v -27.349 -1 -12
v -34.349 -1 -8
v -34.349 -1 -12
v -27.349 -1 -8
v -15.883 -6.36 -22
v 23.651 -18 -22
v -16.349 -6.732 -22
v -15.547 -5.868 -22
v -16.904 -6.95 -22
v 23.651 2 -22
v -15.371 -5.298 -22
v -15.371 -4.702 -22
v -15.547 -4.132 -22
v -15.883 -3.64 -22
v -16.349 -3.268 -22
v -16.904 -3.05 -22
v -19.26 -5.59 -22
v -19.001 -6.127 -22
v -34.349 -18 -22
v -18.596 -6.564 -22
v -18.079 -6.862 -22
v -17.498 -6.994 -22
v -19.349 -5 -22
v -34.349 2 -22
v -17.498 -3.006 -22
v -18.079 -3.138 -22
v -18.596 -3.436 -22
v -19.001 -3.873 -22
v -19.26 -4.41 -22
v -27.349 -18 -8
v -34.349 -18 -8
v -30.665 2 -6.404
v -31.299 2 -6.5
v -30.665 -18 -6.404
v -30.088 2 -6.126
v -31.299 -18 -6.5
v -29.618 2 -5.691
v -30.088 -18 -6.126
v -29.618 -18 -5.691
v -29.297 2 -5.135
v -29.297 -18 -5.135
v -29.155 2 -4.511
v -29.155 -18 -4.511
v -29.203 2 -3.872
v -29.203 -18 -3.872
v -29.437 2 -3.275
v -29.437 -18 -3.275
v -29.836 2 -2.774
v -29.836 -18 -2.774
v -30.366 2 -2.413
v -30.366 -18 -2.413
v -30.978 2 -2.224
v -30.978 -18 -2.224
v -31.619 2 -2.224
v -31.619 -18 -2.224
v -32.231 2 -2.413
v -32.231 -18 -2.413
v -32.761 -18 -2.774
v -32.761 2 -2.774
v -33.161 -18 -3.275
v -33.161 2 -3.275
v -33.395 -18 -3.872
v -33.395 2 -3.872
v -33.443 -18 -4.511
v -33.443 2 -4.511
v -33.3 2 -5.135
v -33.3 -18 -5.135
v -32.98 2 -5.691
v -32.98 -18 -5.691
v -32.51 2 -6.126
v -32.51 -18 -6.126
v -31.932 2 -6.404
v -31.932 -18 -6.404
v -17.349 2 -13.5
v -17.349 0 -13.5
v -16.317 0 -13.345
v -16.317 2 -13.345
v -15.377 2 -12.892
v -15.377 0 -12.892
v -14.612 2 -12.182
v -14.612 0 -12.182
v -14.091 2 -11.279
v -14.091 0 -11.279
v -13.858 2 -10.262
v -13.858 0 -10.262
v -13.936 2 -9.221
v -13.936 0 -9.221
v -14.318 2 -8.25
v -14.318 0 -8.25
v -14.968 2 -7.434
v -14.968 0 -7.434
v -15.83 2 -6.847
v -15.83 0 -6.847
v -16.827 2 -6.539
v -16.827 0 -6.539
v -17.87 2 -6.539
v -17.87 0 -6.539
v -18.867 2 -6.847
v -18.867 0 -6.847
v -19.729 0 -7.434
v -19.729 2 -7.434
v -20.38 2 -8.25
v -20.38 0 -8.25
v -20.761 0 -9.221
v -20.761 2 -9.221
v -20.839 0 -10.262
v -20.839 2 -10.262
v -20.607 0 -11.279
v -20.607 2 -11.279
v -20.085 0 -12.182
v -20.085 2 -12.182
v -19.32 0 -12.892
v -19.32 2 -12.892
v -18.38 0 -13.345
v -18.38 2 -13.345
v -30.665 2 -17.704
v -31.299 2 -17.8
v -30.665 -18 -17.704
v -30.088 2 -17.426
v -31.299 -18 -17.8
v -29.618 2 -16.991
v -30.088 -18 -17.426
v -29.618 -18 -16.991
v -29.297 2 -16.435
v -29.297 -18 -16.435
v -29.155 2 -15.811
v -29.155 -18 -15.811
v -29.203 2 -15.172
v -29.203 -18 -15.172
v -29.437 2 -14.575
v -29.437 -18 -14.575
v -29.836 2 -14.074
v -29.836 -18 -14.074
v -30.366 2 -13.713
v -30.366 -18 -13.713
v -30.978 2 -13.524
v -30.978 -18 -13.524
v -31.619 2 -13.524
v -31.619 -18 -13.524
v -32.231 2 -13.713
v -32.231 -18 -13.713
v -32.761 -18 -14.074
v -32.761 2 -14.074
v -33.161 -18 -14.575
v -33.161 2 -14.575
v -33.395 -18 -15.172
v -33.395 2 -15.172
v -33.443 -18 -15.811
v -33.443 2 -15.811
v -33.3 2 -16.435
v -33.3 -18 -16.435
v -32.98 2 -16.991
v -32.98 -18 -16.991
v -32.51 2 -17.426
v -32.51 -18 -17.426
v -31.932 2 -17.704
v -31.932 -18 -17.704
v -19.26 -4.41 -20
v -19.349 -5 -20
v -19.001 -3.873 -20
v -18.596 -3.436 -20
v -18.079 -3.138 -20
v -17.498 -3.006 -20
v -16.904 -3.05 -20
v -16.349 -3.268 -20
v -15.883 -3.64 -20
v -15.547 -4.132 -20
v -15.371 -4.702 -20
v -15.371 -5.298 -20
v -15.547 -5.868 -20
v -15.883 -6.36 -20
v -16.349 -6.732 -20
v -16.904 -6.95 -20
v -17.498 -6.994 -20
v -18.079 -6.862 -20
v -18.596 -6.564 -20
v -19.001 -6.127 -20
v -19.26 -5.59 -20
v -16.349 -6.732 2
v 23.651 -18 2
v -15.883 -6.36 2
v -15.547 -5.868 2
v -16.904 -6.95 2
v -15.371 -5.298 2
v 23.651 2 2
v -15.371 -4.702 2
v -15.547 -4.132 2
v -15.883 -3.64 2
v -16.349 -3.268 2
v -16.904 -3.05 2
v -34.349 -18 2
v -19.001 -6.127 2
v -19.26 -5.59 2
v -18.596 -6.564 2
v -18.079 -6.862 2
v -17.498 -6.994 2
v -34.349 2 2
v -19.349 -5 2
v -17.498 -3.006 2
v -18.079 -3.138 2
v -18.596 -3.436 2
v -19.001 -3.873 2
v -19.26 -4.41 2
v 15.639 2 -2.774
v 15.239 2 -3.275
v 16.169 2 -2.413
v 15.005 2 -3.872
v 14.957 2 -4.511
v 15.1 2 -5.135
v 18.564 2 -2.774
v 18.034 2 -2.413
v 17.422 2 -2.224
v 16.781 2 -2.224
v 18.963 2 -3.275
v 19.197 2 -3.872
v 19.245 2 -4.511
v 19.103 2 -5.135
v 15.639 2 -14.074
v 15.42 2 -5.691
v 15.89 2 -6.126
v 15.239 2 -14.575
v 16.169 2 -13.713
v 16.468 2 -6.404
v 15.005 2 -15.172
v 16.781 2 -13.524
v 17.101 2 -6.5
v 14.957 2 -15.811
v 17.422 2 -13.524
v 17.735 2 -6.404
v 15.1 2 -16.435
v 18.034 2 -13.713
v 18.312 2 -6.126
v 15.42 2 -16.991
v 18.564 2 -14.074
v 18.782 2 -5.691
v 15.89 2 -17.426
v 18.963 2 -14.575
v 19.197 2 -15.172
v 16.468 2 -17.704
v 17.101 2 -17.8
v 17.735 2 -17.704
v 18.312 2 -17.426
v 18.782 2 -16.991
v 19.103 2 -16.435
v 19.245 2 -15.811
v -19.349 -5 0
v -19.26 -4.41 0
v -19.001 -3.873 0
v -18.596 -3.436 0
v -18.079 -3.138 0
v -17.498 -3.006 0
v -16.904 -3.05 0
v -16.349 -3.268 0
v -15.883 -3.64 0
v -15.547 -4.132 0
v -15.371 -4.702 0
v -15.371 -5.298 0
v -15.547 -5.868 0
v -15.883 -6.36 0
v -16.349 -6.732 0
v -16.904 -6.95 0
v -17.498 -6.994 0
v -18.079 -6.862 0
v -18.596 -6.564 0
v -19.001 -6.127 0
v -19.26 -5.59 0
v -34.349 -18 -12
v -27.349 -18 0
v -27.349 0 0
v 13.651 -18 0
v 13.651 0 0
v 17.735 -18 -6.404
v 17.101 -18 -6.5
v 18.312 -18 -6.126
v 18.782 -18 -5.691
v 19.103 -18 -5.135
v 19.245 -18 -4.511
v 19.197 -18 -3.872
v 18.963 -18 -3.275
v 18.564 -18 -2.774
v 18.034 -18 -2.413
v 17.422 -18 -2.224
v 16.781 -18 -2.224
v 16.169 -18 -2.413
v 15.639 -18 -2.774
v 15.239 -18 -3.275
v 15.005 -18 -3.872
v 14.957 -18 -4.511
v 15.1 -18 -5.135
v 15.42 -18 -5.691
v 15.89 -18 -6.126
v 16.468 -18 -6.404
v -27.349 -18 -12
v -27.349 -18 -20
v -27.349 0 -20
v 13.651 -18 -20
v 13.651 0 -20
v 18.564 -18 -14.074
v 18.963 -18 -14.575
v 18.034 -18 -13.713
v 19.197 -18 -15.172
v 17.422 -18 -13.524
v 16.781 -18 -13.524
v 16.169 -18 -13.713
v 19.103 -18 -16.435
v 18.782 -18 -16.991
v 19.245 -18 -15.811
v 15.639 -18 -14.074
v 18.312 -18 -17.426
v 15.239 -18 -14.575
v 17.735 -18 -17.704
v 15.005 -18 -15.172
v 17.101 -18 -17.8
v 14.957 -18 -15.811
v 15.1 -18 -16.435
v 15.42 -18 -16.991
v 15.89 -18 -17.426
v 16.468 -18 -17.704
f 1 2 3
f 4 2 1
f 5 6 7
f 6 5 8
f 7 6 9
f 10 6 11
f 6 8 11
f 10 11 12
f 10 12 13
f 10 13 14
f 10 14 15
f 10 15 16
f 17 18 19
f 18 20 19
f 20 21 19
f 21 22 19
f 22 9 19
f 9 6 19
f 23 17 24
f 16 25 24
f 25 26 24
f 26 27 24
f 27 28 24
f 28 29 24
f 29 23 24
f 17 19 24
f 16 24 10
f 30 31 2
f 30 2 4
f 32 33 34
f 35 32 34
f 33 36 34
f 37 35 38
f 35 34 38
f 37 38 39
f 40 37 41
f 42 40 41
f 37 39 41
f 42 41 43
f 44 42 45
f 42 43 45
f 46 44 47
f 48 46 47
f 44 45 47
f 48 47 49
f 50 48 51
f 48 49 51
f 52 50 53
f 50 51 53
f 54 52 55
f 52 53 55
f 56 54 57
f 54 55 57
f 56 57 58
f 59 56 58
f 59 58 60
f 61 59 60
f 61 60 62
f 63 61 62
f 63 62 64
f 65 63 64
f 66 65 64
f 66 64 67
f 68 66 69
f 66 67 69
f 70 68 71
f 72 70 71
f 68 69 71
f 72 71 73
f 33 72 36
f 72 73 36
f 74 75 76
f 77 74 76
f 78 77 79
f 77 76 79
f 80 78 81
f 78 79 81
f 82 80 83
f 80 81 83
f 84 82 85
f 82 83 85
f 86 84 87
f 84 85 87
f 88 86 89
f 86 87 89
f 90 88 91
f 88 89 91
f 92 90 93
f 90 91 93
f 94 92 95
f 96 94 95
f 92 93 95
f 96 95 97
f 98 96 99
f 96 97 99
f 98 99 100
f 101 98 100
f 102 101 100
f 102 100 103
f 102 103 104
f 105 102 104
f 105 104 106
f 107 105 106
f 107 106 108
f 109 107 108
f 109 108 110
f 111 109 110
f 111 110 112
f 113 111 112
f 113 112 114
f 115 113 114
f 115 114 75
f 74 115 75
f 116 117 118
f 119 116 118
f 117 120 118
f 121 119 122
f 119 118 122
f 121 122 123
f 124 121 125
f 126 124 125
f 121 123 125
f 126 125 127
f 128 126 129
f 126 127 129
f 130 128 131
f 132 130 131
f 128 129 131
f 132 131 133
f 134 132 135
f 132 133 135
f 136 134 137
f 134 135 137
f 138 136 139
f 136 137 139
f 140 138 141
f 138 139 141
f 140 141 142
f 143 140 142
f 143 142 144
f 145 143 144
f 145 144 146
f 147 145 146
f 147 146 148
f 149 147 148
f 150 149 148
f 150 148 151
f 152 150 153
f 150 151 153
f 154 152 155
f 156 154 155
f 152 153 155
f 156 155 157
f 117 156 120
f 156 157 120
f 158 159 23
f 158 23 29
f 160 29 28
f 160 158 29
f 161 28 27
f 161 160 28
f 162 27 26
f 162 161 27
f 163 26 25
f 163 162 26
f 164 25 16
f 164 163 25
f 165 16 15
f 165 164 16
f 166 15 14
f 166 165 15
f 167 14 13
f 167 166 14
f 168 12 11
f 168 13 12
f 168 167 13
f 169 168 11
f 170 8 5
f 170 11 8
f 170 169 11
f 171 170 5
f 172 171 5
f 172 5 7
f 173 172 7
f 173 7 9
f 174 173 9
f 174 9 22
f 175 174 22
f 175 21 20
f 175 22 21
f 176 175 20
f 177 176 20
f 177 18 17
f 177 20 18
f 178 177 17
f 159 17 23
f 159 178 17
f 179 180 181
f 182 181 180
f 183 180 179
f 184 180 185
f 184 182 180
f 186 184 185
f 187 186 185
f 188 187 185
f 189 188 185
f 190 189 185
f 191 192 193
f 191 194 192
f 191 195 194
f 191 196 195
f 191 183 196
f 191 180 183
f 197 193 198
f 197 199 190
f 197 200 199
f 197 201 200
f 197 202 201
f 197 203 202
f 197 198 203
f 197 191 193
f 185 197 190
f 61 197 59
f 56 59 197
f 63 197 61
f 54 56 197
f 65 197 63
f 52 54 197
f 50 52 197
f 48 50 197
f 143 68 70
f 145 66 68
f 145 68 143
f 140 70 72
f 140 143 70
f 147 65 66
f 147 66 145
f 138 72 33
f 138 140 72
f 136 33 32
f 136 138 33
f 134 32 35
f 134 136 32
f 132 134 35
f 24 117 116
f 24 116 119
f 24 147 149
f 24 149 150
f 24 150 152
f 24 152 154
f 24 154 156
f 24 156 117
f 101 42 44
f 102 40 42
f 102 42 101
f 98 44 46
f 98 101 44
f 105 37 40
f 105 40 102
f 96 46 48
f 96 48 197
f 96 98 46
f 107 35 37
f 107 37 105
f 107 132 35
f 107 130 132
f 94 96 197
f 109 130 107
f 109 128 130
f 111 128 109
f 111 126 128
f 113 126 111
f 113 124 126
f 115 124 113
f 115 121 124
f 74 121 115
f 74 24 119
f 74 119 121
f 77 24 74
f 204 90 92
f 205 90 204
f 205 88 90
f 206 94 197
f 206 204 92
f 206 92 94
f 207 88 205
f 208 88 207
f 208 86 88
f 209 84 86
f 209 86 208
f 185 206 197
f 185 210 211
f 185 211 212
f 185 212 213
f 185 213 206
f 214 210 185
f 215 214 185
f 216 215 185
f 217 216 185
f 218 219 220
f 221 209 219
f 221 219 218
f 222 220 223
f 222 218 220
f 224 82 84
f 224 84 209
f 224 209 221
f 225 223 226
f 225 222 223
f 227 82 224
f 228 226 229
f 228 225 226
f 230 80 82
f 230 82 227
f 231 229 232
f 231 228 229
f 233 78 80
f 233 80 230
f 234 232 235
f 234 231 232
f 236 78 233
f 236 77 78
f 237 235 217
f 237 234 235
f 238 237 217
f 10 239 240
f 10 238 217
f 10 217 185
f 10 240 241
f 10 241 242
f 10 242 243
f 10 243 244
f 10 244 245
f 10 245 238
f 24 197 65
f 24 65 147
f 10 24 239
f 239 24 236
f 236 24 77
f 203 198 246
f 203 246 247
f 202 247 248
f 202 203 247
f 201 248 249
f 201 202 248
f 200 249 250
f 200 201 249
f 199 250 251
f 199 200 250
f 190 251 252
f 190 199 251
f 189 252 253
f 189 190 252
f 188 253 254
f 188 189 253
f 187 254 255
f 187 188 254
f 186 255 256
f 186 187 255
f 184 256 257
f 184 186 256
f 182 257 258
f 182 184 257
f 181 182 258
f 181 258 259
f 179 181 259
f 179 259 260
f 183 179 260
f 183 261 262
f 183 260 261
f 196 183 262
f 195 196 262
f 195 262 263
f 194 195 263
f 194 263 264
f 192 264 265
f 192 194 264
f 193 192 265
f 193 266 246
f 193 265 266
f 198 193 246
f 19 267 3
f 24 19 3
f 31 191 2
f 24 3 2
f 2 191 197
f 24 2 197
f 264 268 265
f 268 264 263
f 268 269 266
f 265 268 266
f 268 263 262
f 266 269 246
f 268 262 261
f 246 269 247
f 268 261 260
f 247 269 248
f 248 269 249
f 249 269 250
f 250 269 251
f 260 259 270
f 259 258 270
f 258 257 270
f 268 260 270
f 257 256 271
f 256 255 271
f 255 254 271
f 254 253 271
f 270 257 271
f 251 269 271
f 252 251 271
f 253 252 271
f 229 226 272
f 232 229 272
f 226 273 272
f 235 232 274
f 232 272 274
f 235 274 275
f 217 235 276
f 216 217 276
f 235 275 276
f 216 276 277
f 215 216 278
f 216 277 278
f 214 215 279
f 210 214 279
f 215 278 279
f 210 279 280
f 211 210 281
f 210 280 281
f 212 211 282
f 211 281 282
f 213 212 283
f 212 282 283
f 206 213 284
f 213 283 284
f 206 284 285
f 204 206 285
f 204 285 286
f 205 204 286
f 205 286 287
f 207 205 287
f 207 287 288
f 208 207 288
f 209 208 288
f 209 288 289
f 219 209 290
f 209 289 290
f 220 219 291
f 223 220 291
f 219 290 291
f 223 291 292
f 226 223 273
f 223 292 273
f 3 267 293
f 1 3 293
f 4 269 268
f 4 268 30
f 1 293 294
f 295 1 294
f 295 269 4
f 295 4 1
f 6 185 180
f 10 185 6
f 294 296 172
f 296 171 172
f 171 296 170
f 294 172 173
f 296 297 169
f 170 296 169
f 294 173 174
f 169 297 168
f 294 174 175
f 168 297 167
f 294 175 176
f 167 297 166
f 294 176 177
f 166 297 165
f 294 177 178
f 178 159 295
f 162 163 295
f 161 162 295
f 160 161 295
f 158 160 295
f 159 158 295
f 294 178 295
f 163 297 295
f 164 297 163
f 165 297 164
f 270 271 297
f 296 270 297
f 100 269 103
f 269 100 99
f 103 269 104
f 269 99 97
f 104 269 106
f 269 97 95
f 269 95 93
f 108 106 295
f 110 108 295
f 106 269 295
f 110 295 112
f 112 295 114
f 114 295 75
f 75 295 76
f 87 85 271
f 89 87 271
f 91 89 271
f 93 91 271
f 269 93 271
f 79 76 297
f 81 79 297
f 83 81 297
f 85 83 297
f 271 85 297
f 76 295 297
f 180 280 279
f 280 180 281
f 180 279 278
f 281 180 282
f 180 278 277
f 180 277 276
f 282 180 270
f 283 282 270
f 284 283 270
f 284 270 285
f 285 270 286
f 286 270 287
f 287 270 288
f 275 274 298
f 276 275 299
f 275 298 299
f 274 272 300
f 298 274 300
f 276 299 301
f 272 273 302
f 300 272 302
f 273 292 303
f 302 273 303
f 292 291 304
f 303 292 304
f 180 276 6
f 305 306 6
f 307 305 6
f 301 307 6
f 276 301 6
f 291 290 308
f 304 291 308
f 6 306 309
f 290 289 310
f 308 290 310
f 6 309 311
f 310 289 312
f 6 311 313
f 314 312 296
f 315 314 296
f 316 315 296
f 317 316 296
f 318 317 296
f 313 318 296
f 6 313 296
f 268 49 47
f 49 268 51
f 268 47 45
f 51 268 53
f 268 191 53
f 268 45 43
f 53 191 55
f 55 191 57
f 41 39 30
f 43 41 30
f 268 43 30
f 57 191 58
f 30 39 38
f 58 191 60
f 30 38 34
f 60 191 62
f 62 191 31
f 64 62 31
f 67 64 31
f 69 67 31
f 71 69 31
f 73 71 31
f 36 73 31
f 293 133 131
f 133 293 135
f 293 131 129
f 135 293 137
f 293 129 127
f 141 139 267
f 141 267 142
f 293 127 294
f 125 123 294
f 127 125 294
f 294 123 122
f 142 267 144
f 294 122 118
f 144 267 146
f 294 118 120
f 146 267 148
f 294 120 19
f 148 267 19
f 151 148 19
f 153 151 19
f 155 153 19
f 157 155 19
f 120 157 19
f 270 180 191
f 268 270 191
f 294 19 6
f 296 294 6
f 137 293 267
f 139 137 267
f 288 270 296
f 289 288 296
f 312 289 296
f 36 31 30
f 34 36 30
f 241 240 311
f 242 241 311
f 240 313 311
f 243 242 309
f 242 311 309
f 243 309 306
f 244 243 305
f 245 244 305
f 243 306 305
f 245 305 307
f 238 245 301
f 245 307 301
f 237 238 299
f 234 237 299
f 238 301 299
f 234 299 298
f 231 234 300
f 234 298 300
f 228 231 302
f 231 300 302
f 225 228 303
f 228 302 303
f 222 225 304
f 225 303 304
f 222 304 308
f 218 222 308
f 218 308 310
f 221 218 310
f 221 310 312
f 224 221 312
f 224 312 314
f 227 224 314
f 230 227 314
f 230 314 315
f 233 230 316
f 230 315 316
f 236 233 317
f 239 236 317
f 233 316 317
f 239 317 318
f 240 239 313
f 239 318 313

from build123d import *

# Parameters (mm, degrees)
SKETCH1_W                = 55
SKETCH1_H                = 20
BOSS_EXTRUDE1_DEPTH      = 7
SKETCH4_R                = 2.5
CUT_EXTRUDE3_DEPTH       = 1
SKETCH5_R                = 1.5
CUT_EXTRUDE4_DEPTH       = 41.197383539
SKETCH6_W                = 7
SKETCH6_H                = 20
BOSS_EXTRUDE2_DEPTH      = 18
SKETCH7_R                = 2.15
CUT_EXTRUDE5_DEPTH       = 7
SKETCH11_R               = 2.15
CUT_EXTRUDE6_DEPTH       = 7
SKETCH12_W               = 55
SKETCH12_H               = 25
BOSS_EXTRUDE3_DEPTH      = 2
SKETCH13_W               = 55
SKETCH13_H               = 25
BOSS_EXTRUDE4_DEPTH      = 2
SKETCH15_W               = 24
SKETCH15_H               = 25
BOSS_EXTRUDE5_DEPTH      = 10
SKETCH29_W               = 65
SKETCH29_H               = 24
CUT_EXTRUDE20_DEPTH      = 5
CUT_EXTRUDE21_DEPTH      = 45.585083194
CUT_EXTRUDE21_DEPTH_BACK = 45.585083194
SKETCH30_R               = 2
SKETCH31_R               = 3.5
CUT_EXTRUDE22_DEPTH      = 45.585083194
SKETCH32_W               = 24
SKETCH32_H               = 20
CUT_EXTRUDE23_DEPTH      = 7
SKETCH33_R               = 2.15
CUT_EXTRUDE24_DEPTH      = 43.811559694
SKETCH35_W               = 7
SKETCH35_H               = 2
CUT_EXTRUDE26_DEPTH      = 17


with BuildPart() as part:
    # Sketch1 → Boss-Extrude1 (new body)
    with BuildSketch(Plane(origin=(0, 0, 0), x_dir=(1, 0, 0), z_dir=(0, 1, 0))):
        with Locations((-6.848648349, 10)):
            Rectangle(SKETCH1_W, SKETCH1_H)
    extrude(amount=BOSS_EXTRUDE1_DEPTH)

    # Sketch4 → Cut-Extrude3 (cut)
    with BuildSketch(Plane(origin=(0, 7, 0), x_dir=(1, 0, 0), z_dir=(0, 1, 0))):
        with Locations(Location((-17.348648349, 10, 0), (0, 0, 270))):
            Circle(SKETCH4_R)
    extrude(amount=-CUT_EXTRUDE3_DEPTH, mode=Mode.SUBTRACT)

    # Sketch5 → Cut-Extrude4 (cut, through all)
    with BuildSketch(Plane(origin=(0, 6, 0), x_dir=(1, 0, 0), z_dir=(0, 1, 0))):
        with Locations(Location((-17.348648349, 10, 0), (0, 0, 270))):
            Circle(SKETCH5_R)
    extrude(amount=-CUT_EXTRUDE4_DEPTH, mode=Mode.SUBTRACT)

    # Sketch6 → Boss-Extrude2 (add)
    with BuildSketch(Plane(origin=(0, 0, 0), x_dir=(-1, 0, 0), z_dir=(0, -1, 0))):
        with Locations((30.848648349, 10)):
            Rectangle(SKETCH6_W, SKETCH6_H)
        with Locations((-17.151351651, 10)):
            Rectangle(SKETCH6_W, SKETCH6_H)
    extrude(amount=BOSS_EXTRUDE2_DEPTH)

    # Sketch7 → Cut-Extrude5 (cut)
    with BuildSketch(Plane(origin=(0, -18, 0), x_dir=(-1, 0, 0), z_dir=(0, -1, 0))):
        with Locations(Location((31.298648349, 15.65, 0), (0, 0, 90))):
            Circle(SKETCH7_R)
        with Locations(Location((31.298648349, 4.35, 0), (0, 0, 90))):
            Circle(SKETCH7_R)
    extrude(amount=-CUT_EXTRUDE5_DEPTH, mode=Mode.SUBTRACT)

    # Sketch11 → Cut-Extrude6 (cut)
    with BuildSketch(Plane(origin=(0, -18, 0), x_dir=(-1, 0, 0), z_dir=(0, -1, 0))):
        with Locations(Location((-17.101351651, 15.65, 0), (0, 0, 90))):
            Circle(SKETCH11_R)
        with Locations(Location((-17.101351651, 4.35, 0), (0, 0, 90))):
            Circle(SKETCH11_R)
    extrude(amount=-CUT_EXTRUDE6_DEPTH, mode=Mode.SUBTRACT)

    # Sketch12 → Boss-Extrude3 (add)
    with BuildSketch(Plane.XY):
        with Locations((-6.848648349, -5.5)):
            Rectangle(SKETCH12_W, SKETCH12_H)
    extrude(amount=BOSS_EXTRUDE3_DEPTH)

    # Sketch13 → Boss-Extrude4 (add)
    with BuildSketch(Plane(origin=(0, 0, -20), x_dir=(-1, 0, 0), z_dir=(0, 0, -1))):
        with Locations((6.848648349, -5.5)):
            Rectangle(SKETCH13_W, SKETCH13_H)
    extrude(amount=BOSS_EXTRUDE4_DEPTH)

    # Sketch15 → Boss-Extrude5 (add)
    with BuildSketch(Plane(origin=(20.651351651, 0, 0), x_dir=(0, 0, -1), z_dir=(1, 0, 0))):
        with Locations((10, -5.5)):
            Rectangle(SKETCH15_W, SKETCH15_H)
    extrude(amount=BOSS_EXTRUDE5_DEPTH)

    # Sketch29 → Cut-Extrude20 (cut)
    with BuildSketch(Plane(origin=(0, 7, 0), x_dir=(1, 0, 0), z_dir=(0, 1, 0))):
        with Locations((-1.848648349, 10)):
            Rectangle(SKETCH29_W, SKETCH29_H)
    extrude(amount=-CUT_EXTRUDE20_DEPTH, mode=Mode.SUBTRACT)

    # Sketch30 → Cut-Extrude21 (cut, two sides: drawn at the far end of the back side and taken through both)
    with BuildSketch(Plane(origin=(0, 0, 0), x_dir=(-1, 0, 0), z_dir=(0, 0, -1)).offset(-CUT_EXTRUDE21_DEPTH_BACK)):
        with Locations((17.348648349, -5)):
            Circle(SKETCH30_R)
    extrude(amount=CUT_EXTRUDE21_DEPTH + CUT_EXTRUDE21_DEPTH_BACK, mode=Mode.SUBTRACT)

    # Sketch31 → Cut-Extrude22 (cut, through all)
    with BuildSketch(Plane.XZ):
        with Locations(Location((-17.348648349, -10, 0), (0, 0, 270))):
            Circle(SKETCH31_R)
    extrude(amount=-CUT_EXTRUDE22_DEPTH, mode=Mode.SUBTRACT)

    # Sketch32 → Cut-Extrude23 (cut)
    with BuildSketch(Plane(origin=(30.651351651, 0, 0), x_dir=(0, 0, -1), z_dir=(1, 0, 0))):
        with Locations((10, -8)):
            Rectangle(SKETCH32_W, SKETCH32_H)
    extrude(amount=-CUT_EXTRUDE23_DEPTH, mode=Mode.SUBTRACT)

    # Sketch33 → Cut-Extrude24 (cut, through all)
    with BuildSketch(Plane.XZ.offset(11)):
        with Locations(Location((17.101351651, -15.65, 0), (0, 0, 270))):
            Circle(SKETCH33_R)
        with Locations(Location((17.101351651, -4.35, 0), (0, 0, 270))):
            Circle(SKETCH33_R)
        with Locations(Location((-31.298648349, -15.65, 0), (0, 0, 270))):
            Circle(SKETCH33_R)
        with Locations(Location((-31.298648349, -4.35, 0), (0, 0, 270))):
            Circle(SKETCH33_R)
    extrude(amount=-CUT_EXTRUDE24_DEPTH, mode=Mode.SUBTRACT)

    # Sketch35 → Cut-Extrude26 (cut)
    with BuildSketch(Plane.XZ.offset(18)):
        with Locations((-30.848648349, -9)):
            Rectangle(SKETCH35_W, SKETCH35_H)
        with Locations((-30.848648349, -11)):
            Rectangle(SKETCH35_W, SKETCH35_H)
    extrude(amount=-CUT_EXTRUDE26_DEPTH, mode=Mode.SUBTRACT)


solid = part.part
